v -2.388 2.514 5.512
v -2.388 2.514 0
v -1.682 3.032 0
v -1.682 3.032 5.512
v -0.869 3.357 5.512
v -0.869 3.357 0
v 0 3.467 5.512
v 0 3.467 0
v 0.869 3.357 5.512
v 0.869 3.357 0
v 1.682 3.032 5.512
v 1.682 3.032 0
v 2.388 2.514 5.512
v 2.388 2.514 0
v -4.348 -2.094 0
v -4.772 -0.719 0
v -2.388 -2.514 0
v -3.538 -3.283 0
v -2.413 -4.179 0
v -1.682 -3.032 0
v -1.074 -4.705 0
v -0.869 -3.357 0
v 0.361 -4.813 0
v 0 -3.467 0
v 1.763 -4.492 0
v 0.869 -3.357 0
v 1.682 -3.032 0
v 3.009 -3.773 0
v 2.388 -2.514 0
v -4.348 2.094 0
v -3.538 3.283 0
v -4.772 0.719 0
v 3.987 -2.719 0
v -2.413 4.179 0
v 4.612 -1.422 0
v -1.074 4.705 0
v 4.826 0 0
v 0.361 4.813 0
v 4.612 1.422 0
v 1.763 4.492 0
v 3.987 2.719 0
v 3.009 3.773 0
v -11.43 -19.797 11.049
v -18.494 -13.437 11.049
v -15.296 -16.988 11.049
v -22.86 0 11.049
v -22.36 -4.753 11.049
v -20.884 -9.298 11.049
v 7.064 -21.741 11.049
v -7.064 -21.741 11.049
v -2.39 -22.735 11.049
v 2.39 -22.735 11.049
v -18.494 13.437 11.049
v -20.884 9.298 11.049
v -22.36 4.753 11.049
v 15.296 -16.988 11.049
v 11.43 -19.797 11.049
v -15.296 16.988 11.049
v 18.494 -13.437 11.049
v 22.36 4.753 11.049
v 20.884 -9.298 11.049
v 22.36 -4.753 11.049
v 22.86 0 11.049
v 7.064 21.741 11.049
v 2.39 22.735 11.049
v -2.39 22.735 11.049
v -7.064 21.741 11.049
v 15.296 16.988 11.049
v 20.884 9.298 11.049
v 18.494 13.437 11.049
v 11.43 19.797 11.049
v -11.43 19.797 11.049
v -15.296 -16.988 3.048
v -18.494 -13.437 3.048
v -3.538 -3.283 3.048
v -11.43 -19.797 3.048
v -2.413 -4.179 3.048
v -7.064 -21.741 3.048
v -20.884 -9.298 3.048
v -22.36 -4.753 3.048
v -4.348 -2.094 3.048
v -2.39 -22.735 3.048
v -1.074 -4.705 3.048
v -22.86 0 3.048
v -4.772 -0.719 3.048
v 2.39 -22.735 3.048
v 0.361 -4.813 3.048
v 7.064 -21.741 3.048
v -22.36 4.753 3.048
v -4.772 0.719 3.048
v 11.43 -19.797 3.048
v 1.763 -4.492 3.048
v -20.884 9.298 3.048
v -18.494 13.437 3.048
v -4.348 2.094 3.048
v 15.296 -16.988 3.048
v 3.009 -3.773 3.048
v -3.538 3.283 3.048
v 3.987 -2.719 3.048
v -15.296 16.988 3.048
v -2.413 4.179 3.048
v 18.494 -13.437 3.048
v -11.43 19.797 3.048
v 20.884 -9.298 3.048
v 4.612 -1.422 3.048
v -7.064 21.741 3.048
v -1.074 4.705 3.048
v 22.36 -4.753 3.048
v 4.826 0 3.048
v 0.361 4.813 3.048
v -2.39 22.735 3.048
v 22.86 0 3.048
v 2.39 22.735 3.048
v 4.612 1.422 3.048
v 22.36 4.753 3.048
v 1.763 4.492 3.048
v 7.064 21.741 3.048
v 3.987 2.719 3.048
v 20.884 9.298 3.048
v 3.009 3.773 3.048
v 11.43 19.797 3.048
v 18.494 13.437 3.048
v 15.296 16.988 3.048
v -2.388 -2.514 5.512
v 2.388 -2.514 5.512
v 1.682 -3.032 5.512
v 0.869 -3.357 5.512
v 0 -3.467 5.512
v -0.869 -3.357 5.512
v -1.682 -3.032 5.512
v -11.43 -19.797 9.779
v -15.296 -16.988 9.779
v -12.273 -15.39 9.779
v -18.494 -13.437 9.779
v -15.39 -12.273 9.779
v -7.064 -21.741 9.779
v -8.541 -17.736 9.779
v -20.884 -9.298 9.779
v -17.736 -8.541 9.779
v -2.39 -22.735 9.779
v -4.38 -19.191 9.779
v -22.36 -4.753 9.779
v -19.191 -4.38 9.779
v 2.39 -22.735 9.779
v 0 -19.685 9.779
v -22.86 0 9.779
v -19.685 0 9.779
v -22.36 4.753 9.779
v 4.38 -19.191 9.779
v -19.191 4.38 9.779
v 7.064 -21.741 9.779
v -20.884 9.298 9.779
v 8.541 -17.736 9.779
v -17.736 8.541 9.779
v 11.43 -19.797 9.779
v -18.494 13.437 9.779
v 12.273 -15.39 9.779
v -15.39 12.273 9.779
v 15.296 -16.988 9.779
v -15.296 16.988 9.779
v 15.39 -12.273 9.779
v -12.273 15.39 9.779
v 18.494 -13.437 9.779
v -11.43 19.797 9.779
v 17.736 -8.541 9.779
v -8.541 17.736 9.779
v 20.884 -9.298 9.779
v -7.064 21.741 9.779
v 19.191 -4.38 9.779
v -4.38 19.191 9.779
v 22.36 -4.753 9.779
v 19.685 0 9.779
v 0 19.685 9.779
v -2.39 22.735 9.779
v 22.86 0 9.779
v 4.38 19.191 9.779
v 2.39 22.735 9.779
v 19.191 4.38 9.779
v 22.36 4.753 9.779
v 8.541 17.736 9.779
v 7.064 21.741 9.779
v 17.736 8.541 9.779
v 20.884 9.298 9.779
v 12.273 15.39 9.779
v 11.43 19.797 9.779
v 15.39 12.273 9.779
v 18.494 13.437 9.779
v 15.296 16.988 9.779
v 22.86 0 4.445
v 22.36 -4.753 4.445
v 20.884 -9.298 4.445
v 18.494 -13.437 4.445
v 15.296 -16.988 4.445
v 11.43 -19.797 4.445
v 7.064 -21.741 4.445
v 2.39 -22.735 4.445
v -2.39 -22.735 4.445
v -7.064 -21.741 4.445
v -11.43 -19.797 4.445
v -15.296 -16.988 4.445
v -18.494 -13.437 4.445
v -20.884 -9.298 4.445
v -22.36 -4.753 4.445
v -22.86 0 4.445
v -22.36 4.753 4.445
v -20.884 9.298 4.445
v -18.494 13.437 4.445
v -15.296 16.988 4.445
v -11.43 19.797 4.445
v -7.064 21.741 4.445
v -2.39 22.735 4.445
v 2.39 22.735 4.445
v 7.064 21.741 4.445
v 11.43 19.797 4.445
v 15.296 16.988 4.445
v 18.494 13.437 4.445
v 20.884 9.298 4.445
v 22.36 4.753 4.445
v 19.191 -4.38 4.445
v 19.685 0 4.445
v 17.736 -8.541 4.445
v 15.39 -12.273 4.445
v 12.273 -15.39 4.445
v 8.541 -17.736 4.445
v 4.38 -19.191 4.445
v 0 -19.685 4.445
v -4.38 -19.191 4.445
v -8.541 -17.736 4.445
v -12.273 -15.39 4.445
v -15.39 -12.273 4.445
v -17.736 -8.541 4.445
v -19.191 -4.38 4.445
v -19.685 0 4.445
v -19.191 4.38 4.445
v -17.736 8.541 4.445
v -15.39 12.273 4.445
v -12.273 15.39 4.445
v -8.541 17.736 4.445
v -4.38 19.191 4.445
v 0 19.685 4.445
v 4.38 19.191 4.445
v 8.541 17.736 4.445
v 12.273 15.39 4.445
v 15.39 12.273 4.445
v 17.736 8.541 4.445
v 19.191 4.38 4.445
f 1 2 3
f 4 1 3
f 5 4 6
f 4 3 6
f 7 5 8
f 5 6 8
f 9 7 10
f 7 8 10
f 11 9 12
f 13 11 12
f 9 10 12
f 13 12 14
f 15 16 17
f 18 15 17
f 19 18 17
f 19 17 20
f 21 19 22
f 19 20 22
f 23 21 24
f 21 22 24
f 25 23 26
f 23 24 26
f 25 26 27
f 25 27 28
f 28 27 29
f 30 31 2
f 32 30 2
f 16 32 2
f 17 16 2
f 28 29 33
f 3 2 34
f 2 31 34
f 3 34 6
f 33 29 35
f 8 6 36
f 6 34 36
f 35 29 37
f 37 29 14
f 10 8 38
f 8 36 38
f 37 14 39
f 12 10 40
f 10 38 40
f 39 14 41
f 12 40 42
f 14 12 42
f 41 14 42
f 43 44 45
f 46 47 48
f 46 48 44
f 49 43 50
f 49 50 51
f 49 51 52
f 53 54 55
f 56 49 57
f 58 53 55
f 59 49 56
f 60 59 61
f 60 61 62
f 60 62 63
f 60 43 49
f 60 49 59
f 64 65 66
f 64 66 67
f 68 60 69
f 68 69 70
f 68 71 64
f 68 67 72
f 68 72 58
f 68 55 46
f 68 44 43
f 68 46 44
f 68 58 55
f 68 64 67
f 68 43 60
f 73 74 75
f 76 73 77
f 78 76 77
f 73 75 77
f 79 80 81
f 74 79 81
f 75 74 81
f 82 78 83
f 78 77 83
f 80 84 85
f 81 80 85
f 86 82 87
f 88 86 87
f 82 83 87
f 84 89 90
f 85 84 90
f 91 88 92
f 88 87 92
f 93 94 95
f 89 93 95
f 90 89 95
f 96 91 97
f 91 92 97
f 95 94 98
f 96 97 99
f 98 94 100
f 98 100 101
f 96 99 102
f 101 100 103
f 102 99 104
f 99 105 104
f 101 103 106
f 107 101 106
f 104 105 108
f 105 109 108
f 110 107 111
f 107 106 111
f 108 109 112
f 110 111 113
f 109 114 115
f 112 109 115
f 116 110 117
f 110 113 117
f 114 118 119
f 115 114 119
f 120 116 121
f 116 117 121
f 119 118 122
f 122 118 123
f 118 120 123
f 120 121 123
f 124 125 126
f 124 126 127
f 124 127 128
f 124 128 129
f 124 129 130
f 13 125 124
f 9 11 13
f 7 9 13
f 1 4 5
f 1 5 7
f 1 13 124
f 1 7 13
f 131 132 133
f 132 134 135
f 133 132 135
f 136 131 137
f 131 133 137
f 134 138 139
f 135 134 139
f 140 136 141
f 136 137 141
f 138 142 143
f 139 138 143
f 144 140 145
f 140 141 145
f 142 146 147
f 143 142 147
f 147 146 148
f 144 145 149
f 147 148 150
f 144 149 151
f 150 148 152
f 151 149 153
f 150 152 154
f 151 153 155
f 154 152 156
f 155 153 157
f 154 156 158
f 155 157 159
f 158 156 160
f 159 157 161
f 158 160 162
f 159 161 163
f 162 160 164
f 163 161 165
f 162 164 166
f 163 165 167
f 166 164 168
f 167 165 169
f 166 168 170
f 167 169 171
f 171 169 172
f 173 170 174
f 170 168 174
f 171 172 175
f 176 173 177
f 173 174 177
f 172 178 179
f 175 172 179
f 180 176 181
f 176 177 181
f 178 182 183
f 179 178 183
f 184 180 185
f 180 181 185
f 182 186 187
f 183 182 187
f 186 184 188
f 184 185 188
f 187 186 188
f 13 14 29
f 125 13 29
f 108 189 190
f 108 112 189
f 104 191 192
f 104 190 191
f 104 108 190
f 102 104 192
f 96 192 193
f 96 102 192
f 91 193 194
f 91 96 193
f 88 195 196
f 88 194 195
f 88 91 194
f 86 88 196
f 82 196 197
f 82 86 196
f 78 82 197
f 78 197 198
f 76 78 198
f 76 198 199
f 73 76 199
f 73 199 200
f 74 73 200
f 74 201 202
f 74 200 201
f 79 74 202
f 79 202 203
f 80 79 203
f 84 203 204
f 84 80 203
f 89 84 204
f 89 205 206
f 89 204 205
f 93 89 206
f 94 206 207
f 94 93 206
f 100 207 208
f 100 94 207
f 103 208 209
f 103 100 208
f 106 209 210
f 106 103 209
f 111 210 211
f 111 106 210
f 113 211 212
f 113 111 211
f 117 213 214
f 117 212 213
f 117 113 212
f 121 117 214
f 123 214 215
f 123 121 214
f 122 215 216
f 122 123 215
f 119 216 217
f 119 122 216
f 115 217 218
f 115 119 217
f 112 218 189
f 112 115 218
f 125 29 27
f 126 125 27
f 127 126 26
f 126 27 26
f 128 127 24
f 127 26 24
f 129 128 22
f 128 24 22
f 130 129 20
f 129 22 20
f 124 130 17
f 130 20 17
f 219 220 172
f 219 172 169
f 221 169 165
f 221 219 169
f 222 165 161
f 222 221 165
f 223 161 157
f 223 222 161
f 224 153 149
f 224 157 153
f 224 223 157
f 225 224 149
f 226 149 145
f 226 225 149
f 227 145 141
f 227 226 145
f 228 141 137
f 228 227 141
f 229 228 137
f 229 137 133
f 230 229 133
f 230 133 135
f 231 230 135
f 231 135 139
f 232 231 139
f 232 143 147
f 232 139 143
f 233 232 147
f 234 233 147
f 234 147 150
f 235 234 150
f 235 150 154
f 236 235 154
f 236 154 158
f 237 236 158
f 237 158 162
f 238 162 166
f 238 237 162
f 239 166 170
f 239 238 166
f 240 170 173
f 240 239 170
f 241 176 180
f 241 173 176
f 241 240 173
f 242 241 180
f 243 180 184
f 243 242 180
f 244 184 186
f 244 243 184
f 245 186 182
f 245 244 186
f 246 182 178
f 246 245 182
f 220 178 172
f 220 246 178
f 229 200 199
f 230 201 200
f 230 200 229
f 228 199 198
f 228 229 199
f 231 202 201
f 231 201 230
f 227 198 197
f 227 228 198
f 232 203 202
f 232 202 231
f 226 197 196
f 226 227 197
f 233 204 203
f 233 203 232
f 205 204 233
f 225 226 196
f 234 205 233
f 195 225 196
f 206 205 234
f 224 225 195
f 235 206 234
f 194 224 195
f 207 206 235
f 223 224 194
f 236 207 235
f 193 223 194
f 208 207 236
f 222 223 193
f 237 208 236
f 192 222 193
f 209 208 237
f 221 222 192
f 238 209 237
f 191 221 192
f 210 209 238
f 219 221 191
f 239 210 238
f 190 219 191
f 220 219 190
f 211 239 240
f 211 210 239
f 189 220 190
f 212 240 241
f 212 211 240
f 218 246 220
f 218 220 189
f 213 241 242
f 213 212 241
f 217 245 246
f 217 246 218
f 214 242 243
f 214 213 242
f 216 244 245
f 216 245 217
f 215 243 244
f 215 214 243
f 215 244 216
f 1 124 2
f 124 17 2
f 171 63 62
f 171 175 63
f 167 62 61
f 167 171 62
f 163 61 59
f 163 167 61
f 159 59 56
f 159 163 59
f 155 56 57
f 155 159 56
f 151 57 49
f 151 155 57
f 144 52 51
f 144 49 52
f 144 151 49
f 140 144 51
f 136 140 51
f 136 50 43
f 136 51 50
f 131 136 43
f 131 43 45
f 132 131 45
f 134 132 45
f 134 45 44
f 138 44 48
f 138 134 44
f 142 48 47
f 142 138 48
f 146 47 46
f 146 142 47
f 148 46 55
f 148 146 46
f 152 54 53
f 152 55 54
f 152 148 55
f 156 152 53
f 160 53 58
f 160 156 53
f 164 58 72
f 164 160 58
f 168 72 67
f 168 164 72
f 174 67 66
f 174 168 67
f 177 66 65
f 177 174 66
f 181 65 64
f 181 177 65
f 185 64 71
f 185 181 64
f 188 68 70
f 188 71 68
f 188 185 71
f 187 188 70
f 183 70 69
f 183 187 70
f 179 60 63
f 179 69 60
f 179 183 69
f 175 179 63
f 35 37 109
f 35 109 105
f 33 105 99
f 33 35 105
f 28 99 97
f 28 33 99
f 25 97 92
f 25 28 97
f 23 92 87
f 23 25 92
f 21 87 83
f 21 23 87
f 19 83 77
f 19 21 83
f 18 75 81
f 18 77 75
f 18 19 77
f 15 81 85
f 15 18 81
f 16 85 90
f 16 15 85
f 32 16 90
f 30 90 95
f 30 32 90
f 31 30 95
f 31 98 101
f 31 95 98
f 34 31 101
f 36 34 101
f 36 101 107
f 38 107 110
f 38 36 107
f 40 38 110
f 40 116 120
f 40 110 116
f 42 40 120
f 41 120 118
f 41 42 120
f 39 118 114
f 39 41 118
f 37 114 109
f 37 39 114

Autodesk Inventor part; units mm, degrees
ref_plane "YZ Plane" through (0, 0, 0) normal (1, 0, 0) x (0, 1, 0)
ref_plane "XZ Plane" through (0, 0, 0) normal (0, 1, 0) x (-1, 0, 0)
ref_plane "XY Plane" through (0, 0, 0) normal (0, 0, 1) x (1, 0, 0)
sketch "Sketch1" plane through (0, 0, 0) normal (0, 0, 1) x (1, 0, 0)
  circle A0 centre (0, 0) radius 4.826
  dimension "d0" = 9.652
extrude "Extrusion1" add sketch "Sketch1" along normal blind 3.048
sketch "Sketch2" plane through (0, 0, 3.048) normal (0, 0, 1) x (1, 0, 0)
  circle A0 centre (0, 0) radius 22.86
  dimension "d3" = 45.72
extrude "Extrusion2" add sketch "Sketch2" along normal blind 1.397
sketch "Sketch4" plane through (0, 0, 4.445) normal (0, 0, 1) x (1, 0, 0)
  circle A0 centre (0, 0) radius 19.685
  dimension "d6" = 39.37
extrude "Extrusion3" add sketch "Sketch4" along normal blind 5.334
sketch "Sketch6" plane through (0, 0, 9.779) normal (0, 0, 1) x (1, 0, 0)
  circle A0 centre (0, 0) radius 4.826 projected
  circle A1 centre (0, 0) radius 22.86
extrude "Extrusion4" add sketch "Sketch6" along normal blind 1.27 contours A0 | A1
sketch "Sketch9" plane through (0, 0, 0) normal (0, 0, -1) x (-1, 0, 0)
  line L0 (2.3876, -2.514) -> (2.3876, 2.514)
  line L1 (-2.3876, 2.514) -> (-2.3876, -2.514)
  line L2 (-1.2735, -3.2247) -> (1.2735, 3.2247) construction
  line L3 (1.2735, -3.2247) -> (-1.2735, 3.2247) construction
  arc A0 (-2.3876, -2.514) -> (2.3876, -2.514) centre (0, 0) ccw
  arc A1 (2.3876, 2.514) -> (-2.3876, 2.514) centre (0, 0) ccw
extrude "Extrusion6" cut sketch "Sketch9" against normal blind 5.5118
properties part number "Wheel"
